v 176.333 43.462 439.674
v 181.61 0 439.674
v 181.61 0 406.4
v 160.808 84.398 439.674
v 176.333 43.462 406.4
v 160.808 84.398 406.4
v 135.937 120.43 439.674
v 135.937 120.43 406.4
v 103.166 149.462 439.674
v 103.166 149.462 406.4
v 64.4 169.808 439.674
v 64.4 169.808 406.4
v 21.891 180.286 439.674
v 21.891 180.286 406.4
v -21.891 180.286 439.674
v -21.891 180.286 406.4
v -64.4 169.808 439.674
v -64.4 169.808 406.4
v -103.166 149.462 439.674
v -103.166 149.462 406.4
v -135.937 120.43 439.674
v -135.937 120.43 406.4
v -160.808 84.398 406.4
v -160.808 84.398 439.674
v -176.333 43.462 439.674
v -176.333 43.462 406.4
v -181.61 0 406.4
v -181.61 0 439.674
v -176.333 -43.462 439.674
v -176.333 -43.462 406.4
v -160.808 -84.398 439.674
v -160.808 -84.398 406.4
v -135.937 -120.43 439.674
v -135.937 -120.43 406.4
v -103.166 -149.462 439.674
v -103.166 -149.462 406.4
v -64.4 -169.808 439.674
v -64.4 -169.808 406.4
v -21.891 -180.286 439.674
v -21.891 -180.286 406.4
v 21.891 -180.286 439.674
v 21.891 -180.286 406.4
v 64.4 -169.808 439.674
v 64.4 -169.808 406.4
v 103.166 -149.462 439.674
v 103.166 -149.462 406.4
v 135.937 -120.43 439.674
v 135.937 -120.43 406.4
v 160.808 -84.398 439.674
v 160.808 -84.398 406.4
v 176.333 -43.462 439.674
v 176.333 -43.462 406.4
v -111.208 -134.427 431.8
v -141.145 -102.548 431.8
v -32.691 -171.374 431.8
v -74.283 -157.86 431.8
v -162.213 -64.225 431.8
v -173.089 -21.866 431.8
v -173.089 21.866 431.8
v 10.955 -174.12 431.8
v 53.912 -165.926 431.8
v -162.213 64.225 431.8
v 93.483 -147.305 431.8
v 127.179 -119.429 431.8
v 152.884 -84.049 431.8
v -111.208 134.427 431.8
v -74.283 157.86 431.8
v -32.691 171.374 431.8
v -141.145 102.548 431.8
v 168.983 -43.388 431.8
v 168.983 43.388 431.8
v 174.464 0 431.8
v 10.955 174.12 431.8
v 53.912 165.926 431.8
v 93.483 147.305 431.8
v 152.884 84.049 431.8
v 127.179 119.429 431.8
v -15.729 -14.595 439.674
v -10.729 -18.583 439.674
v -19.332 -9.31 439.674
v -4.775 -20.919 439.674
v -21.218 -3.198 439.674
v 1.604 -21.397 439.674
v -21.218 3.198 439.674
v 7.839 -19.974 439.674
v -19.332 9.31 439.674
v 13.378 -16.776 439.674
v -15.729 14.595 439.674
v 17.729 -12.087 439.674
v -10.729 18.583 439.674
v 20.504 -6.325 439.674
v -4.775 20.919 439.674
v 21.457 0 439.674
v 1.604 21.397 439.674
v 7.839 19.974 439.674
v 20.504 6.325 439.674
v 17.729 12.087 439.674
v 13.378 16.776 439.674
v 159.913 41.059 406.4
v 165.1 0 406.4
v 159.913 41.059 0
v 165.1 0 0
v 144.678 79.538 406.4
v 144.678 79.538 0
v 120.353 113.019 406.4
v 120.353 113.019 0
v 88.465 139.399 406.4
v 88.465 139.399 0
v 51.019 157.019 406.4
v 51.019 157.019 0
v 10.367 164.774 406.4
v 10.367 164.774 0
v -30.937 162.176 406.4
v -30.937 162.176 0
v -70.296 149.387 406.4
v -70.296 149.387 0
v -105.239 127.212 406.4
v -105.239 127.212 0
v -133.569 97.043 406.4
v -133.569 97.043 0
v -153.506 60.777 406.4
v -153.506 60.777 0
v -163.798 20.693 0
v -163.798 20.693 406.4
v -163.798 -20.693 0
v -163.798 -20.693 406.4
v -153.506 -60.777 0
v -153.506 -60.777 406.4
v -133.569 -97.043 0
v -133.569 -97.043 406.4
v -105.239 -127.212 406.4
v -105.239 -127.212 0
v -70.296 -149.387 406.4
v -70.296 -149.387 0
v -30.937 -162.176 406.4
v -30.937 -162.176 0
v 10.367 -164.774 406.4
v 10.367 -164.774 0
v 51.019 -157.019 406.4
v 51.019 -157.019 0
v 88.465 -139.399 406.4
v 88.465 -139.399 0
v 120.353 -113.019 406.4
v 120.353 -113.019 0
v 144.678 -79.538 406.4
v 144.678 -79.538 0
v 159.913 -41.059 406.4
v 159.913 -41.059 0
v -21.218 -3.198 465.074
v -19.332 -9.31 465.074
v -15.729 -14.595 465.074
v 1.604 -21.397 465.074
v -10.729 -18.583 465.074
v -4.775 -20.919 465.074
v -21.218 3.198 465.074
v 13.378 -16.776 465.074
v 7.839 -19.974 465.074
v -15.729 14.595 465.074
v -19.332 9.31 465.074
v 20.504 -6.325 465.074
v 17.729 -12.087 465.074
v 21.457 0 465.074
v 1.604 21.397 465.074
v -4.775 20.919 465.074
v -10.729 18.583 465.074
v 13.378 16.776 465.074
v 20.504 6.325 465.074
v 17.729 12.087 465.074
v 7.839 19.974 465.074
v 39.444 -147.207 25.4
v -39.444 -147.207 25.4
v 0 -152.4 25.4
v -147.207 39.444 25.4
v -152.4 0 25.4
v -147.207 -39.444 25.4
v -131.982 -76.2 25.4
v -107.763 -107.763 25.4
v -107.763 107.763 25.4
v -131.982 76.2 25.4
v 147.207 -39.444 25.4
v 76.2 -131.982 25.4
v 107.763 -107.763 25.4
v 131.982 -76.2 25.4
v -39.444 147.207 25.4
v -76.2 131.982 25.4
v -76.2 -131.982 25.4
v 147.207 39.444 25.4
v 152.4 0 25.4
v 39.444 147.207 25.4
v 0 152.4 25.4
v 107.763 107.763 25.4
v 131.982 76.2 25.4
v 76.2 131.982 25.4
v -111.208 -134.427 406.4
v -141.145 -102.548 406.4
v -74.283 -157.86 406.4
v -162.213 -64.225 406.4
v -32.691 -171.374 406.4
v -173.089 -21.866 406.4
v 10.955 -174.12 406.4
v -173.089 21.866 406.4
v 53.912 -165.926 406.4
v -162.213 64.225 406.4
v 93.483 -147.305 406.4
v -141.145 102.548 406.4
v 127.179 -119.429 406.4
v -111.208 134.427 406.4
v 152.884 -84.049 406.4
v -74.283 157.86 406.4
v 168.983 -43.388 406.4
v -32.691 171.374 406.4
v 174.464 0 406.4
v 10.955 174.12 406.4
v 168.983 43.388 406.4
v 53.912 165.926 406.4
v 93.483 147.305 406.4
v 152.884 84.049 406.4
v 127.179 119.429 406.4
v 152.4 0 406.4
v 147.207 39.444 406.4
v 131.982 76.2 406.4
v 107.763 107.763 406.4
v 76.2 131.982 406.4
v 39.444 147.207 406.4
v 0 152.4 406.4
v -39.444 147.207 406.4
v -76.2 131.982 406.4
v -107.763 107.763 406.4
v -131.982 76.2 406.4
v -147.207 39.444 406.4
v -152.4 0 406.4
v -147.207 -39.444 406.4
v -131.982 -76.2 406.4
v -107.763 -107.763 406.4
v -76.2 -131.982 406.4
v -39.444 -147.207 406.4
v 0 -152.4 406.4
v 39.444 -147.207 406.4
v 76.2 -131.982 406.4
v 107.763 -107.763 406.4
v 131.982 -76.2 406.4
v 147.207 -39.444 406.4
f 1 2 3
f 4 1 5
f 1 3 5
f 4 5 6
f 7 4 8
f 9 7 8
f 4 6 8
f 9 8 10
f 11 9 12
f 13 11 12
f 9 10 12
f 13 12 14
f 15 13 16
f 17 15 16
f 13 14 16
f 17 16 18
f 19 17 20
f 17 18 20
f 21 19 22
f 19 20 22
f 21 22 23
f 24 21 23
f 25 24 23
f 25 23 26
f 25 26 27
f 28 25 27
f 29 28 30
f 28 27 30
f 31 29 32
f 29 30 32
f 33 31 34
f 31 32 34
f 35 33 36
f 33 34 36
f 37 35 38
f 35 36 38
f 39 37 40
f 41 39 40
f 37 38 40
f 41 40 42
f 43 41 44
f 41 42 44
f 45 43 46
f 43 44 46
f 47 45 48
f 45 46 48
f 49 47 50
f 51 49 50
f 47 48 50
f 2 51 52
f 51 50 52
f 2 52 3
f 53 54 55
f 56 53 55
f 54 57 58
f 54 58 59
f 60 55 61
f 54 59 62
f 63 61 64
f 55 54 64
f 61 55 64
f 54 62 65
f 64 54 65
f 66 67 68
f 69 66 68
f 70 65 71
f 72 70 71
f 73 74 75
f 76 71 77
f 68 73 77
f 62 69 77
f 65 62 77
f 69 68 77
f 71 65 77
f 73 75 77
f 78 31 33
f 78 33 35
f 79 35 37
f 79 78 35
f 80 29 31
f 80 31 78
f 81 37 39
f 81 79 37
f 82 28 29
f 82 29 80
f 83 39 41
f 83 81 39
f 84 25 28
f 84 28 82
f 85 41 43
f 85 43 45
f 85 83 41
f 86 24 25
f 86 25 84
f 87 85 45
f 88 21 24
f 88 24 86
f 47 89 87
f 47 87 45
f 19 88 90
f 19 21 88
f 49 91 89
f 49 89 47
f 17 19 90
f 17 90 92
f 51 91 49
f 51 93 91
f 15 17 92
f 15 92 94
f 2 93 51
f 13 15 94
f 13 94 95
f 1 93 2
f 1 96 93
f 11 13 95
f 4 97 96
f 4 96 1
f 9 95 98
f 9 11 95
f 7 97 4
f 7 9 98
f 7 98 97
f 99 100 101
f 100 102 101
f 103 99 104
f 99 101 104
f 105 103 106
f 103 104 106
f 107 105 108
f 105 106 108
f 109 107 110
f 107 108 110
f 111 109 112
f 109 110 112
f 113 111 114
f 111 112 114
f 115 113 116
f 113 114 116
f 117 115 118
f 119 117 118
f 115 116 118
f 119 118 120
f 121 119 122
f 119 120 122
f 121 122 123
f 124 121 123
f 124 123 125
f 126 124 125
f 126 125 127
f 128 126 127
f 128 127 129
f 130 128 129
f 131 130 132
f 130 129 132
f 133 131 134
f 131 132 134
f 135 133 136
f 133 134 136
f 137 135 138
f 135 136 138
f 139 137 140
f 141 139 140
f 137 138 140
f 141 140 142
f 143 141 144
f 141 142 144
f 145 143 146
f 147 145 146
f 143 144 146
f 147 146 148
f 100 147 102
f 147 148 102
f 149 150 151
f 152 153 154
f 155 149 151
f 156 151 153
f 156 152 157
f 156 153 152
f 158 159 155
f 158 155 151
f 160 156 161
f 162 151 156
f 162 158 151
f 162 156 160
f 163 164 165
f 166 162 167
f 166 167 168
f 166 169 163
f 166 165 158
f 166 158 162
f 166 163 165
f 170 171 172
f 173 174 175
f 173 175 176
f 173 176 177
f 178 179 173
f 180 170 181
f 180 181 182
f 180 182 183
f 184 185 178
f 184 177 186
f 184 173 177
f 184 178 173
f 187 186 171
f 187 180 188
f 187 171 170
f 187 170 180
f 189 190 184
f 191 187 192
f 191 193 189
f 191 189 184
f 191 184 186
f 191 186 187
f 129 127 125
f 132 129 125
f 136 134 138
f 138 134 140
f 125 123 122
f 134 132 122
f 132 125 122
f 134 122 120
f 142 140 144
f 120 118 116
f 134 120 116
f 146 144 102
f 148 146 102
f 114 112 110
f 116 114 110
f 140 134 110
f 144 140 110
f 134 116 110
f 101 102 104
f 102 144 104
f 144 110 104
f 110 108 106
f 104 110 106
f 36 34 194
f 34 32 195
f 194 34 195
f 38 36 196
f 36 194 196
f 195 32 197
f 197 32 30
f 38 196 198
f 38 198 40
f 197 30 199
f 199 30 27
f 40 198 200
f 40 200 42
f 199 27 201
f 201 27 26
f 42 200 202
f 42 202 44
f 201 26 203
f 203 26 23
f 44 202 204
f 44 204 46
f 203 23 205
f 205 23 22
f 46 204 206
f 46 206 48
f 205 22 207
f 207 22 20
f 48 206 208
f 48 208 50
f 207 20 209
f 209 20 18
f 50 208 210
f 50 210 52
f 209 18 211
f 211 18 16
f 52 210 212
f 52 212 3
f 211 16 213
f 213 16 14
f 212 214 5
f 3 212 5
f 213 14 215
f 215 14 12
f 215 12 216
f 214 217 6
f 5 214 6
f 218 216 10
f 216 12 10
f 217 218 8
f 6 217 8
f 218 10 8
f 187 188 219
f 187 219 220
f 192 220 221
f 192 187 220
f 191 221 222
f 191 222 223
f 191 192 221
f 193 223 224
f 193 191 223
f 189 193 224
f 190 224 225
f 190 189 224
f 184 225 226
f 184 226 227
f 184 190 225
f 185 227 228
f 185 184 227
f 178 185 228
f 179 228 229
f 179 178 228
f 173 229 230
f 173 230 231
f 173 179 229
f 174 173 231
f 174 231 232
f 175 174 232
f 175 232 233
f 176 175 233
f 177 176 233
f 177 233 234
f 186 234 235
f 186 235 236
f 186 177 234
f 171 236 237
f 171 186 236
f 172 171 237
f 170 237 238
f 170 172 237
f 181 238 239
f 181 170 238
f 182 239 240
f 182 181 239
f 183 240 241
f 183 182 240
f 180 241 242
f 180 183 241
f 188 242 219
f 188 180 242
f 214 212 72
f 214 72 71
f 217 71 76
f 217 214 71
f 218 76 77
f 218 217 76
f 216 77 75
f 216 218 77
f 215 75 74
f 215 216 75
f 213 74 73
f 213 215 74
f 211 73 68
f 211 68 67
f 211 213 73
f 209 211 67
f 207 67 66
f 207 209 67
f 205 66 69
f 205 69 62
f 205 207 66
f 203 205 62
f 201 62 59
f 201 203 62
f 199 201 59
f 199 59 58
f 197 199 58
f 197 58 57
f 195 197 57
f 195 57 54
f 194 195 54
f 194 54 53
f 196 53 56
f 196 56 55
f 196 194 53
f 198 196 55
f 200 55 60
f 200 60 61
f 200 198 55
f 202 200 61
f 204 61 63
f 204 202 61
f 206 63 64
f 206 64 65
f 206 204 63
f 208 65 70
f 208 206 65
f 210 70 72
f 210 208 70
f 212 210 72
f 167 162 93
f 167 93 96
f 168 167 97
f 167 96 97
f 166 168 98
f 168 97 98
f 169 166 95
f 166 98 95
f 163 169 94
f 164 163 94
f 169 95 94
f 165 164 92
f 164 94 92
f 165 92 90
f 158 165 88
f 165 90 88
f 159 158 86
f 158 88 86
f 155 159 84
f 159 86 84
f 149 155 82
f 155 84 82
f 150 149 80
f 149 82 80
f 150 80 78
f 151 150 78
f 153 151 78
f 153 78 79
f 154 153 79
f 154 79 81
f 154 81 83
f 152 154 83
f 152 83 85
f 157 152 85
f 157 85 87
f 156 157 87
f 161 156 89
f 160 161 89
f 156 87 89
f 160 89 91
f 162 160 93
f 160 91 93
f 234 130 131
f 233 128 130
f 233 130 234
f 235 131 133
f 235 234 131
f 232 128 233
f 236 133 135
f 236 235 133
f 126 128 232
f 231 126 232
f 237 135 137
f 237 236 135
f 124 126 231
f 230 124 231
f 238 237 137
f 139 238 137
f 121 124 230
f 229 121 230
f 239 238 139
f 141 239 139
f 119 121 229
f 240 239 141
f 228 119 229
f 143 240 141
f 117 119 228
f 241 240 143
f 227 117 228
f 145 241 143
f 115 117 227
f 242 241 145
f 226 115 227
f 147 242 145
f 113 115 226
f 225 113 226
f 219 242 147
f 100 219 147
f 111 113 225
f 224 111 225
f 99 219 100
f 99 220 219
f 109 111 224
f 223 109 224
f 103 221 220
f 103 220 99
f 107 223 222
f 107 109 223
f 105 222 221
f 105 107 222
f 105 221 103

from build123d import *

# Parameters (mm, degrees)
F0_R     = 165.1
F1_DEPTH = 25.4
F2_R     = 165.1
F2_R_2   = 152.4
F3_DEPTH = 381
F4_R     = 181.61
F4_R_2   = 174.464405
F5_DEPTH = 25.4
F6_R     = 181.61
F7_DEPTH = 7.874
F8_R     = 21.457342
F9_DEPTH = 25.4


with BuildPart() as f1:
    # F0 (on Top) → F1 (new body)
    with BuildSketch(Plane.XY):
        Circle(F0_R)
    extrude(amount=F1_DEPTH)

    # F2 (on face) → F3 (join)
    with BuildSketch(Plane.XY.offset(25.4)):
        Circle(F2_R)
        Circle(F2_R_2, mode=Mode.SUBTRACT)
    extrude(amount=F3_DEPTH)


with BuildPart() as f5:
    # F4 (on face) → F5 (new body)
    with BuildSketch(Plane.XY.offset(406.4)):
        Circle(F4_R)
        Circle(F4_R_2, mode=Mode.SUBTRACT)
    extrude(amount=F5_DEPTH)

    # F6 (on face) → F7 (join)
    with BuildSketch(Plane.XY.offset(431.8)):
        Circle(F6_R)
    extrude(amount=F7_DEPTH)

    # F8 (on face) → F9 (join)
    with BuildSketch(Plane.XY.offset(439.674)):
        Circle(F8_R)
    extrude(amount=F9_DEPTH)


solid = Compound([f1.part, f5.part])
